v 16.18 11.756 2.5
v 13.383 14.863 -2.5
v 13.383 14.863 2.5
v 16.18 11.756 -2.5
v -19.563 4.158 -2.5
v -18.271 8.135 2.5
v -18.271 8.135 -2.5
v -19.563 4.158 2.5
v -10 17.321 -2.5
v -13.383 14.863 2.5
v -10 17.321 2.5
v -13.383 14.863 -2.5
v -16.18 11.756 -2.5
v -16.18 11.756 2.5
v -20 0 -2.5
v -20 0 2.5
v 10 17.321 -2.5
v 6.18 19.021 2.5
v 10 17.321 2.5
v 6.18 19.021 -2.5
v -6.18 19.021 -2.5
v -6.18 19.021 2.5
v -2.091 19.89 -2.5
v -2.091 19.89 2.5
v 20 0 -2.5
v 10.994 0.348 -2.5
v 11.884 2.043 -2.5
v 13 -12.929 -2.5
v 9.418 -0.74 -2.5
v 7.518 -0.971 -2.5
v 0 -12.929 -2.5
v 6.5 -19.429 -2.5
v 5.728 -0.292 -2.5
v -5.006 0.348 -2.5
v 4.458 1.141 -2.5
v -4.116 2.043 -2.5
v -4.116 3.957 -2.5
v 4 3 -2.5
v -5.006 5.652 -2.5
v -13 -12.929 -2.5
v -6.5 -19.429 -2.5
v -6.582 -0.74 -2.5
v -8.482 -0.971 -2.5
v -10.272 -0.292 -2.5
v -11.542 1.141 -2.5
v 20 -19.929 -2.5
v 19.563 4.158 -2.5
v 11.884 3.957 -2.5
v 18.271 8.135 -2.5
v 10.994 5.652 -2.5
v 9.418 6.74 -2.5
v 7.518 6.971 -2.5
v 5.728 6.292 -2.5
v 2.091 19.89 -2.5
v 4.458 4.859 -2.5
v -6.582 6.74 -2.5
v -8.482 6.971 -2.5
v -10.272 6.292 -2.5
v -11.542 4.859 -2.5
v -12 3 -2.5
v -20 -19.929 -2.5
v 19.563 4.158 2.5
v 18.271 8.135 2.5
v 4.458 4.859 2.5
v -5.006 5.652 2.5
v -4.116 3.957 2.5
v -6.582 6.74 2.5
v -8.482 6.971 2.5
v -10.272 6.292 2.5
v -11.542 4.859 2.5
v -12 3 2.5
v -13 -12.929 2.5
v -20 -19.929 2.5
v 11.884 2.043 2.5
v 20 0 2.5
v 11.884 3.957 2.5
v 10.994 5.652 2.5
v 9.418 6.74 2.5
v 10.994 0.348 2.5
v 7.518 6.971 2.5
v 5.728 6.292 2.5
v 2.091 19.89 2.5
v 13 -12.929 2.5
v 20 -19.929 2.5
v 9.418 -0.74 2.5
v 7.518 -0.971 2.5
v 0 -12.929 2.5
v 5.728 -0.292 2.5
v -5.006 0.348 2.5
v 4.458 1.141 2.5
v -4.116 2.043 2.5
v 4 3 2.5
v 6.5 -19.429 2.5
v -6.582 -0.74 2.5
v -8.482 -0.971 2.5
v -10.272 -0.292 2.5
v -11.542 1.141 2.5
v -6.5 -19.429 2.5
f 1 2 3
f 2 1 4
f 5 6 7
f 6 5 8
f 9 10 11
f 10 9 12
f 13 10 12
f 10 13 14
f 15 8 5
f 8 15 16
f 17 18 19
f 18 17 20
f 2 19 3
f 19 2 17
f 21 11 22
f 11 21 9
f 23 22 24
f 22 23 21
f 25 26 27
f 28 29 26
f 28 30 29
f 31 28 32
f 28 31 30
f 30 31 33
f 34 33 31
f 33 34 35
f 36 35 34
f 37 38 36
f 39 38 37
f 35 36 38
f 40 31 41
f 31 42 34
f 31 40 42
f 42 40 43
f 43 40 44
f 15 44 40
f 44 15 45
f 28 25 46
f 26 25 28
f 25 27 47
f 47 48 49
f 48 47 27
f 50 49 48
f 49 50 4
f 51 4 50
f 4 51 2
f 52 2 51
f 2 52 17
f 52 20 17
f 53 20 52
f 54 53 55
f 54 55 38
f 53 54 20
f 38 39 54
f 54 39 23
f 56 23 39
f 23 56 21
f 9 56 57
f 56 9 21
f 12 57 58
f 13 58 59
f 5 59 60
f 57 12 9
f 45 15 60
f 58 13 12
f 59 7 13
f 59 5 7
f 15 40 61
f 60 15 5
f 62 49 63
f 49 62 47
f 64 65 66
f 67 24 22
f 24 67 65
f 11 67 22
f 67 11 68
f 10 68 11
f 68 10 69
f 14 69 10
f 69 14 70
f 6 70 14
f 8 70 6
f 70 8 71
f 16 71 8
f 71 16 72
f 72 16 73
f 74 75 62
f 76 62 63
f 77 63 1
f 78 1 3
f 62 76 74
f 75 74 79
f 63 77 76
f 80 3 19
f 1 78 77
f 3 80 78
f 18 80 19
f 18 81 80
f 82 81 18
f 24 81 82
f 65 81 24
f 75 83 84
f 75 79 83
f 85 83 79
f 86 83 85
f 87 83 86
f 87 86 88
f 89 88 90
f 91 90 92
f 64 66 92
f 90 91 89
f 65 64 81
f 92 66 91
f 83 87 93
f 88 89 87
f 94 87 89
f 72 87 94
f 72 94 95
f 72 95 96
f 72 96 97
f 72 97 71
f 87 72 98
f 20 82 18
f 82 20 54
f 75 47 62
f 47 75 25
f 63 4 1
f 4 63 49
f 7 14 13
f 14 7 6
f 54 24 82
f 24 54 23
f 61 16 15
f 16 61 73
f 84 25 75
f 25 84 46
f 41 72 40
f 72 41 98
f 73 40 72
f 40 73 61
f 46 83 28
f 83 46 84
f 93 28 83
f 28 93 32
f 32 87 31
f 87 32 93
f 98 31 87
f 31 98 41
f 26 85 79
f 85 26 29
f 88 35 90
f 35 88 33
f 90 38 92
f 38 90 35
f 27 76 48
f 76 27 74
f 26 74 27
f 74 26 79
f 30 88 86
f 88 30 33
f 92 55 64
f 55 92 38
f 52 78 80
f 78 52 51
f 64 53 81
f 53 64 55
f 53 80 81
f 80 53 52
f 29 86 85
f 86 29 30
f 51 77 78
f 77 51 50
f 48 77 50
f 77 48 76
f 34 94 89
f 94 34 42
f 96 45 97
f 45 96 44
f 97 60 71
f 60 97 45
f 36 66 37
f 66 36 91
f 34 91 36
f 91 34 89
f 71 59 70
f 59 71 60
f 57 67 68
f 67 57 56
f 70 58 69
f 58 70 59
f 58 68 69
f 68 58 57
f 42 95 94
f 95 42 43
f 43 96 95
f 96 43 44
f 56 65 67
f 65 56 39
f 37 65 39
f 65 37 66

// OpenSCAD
pupils=false;
rotate ([0, 0, 180]) 
difference () {
  union() {
    cylinder(r=20, center=true, h=5);
    translate([0, 10, 0]) {
       cube([40, 20, 5], center=true);
    }
  }

  translate([13, 20, 0]) {
    rotate([0, 0, 45]) {
       cube([10, 10, 10], center=true);
    }
  }

  translate([-13, 20, 0]) {
    rotate([0, 0, 45]) {
       cube([10, 10, 10], center=true);
    }
  }

  translate([0, 20, 0]) {
    rotate([0, 0, 45]) {
       cube([10, 10, 10], center=true);
    }
  }

  translate([-8, -3, 0]) {
     cylinder(r=4, center=true, h=10);
  }

  translate([8, -3, 0]) {
     cylinder(r=4, center=true, h=10);
  }

}

if (pupils) {
  translate([-9, -1, 0]) {
     cylinder(r=3, center=true, h=5);
  }

  translate([7, -1, 0]) {
     cylinder(r=3, center=true, h=5);
  }
}
